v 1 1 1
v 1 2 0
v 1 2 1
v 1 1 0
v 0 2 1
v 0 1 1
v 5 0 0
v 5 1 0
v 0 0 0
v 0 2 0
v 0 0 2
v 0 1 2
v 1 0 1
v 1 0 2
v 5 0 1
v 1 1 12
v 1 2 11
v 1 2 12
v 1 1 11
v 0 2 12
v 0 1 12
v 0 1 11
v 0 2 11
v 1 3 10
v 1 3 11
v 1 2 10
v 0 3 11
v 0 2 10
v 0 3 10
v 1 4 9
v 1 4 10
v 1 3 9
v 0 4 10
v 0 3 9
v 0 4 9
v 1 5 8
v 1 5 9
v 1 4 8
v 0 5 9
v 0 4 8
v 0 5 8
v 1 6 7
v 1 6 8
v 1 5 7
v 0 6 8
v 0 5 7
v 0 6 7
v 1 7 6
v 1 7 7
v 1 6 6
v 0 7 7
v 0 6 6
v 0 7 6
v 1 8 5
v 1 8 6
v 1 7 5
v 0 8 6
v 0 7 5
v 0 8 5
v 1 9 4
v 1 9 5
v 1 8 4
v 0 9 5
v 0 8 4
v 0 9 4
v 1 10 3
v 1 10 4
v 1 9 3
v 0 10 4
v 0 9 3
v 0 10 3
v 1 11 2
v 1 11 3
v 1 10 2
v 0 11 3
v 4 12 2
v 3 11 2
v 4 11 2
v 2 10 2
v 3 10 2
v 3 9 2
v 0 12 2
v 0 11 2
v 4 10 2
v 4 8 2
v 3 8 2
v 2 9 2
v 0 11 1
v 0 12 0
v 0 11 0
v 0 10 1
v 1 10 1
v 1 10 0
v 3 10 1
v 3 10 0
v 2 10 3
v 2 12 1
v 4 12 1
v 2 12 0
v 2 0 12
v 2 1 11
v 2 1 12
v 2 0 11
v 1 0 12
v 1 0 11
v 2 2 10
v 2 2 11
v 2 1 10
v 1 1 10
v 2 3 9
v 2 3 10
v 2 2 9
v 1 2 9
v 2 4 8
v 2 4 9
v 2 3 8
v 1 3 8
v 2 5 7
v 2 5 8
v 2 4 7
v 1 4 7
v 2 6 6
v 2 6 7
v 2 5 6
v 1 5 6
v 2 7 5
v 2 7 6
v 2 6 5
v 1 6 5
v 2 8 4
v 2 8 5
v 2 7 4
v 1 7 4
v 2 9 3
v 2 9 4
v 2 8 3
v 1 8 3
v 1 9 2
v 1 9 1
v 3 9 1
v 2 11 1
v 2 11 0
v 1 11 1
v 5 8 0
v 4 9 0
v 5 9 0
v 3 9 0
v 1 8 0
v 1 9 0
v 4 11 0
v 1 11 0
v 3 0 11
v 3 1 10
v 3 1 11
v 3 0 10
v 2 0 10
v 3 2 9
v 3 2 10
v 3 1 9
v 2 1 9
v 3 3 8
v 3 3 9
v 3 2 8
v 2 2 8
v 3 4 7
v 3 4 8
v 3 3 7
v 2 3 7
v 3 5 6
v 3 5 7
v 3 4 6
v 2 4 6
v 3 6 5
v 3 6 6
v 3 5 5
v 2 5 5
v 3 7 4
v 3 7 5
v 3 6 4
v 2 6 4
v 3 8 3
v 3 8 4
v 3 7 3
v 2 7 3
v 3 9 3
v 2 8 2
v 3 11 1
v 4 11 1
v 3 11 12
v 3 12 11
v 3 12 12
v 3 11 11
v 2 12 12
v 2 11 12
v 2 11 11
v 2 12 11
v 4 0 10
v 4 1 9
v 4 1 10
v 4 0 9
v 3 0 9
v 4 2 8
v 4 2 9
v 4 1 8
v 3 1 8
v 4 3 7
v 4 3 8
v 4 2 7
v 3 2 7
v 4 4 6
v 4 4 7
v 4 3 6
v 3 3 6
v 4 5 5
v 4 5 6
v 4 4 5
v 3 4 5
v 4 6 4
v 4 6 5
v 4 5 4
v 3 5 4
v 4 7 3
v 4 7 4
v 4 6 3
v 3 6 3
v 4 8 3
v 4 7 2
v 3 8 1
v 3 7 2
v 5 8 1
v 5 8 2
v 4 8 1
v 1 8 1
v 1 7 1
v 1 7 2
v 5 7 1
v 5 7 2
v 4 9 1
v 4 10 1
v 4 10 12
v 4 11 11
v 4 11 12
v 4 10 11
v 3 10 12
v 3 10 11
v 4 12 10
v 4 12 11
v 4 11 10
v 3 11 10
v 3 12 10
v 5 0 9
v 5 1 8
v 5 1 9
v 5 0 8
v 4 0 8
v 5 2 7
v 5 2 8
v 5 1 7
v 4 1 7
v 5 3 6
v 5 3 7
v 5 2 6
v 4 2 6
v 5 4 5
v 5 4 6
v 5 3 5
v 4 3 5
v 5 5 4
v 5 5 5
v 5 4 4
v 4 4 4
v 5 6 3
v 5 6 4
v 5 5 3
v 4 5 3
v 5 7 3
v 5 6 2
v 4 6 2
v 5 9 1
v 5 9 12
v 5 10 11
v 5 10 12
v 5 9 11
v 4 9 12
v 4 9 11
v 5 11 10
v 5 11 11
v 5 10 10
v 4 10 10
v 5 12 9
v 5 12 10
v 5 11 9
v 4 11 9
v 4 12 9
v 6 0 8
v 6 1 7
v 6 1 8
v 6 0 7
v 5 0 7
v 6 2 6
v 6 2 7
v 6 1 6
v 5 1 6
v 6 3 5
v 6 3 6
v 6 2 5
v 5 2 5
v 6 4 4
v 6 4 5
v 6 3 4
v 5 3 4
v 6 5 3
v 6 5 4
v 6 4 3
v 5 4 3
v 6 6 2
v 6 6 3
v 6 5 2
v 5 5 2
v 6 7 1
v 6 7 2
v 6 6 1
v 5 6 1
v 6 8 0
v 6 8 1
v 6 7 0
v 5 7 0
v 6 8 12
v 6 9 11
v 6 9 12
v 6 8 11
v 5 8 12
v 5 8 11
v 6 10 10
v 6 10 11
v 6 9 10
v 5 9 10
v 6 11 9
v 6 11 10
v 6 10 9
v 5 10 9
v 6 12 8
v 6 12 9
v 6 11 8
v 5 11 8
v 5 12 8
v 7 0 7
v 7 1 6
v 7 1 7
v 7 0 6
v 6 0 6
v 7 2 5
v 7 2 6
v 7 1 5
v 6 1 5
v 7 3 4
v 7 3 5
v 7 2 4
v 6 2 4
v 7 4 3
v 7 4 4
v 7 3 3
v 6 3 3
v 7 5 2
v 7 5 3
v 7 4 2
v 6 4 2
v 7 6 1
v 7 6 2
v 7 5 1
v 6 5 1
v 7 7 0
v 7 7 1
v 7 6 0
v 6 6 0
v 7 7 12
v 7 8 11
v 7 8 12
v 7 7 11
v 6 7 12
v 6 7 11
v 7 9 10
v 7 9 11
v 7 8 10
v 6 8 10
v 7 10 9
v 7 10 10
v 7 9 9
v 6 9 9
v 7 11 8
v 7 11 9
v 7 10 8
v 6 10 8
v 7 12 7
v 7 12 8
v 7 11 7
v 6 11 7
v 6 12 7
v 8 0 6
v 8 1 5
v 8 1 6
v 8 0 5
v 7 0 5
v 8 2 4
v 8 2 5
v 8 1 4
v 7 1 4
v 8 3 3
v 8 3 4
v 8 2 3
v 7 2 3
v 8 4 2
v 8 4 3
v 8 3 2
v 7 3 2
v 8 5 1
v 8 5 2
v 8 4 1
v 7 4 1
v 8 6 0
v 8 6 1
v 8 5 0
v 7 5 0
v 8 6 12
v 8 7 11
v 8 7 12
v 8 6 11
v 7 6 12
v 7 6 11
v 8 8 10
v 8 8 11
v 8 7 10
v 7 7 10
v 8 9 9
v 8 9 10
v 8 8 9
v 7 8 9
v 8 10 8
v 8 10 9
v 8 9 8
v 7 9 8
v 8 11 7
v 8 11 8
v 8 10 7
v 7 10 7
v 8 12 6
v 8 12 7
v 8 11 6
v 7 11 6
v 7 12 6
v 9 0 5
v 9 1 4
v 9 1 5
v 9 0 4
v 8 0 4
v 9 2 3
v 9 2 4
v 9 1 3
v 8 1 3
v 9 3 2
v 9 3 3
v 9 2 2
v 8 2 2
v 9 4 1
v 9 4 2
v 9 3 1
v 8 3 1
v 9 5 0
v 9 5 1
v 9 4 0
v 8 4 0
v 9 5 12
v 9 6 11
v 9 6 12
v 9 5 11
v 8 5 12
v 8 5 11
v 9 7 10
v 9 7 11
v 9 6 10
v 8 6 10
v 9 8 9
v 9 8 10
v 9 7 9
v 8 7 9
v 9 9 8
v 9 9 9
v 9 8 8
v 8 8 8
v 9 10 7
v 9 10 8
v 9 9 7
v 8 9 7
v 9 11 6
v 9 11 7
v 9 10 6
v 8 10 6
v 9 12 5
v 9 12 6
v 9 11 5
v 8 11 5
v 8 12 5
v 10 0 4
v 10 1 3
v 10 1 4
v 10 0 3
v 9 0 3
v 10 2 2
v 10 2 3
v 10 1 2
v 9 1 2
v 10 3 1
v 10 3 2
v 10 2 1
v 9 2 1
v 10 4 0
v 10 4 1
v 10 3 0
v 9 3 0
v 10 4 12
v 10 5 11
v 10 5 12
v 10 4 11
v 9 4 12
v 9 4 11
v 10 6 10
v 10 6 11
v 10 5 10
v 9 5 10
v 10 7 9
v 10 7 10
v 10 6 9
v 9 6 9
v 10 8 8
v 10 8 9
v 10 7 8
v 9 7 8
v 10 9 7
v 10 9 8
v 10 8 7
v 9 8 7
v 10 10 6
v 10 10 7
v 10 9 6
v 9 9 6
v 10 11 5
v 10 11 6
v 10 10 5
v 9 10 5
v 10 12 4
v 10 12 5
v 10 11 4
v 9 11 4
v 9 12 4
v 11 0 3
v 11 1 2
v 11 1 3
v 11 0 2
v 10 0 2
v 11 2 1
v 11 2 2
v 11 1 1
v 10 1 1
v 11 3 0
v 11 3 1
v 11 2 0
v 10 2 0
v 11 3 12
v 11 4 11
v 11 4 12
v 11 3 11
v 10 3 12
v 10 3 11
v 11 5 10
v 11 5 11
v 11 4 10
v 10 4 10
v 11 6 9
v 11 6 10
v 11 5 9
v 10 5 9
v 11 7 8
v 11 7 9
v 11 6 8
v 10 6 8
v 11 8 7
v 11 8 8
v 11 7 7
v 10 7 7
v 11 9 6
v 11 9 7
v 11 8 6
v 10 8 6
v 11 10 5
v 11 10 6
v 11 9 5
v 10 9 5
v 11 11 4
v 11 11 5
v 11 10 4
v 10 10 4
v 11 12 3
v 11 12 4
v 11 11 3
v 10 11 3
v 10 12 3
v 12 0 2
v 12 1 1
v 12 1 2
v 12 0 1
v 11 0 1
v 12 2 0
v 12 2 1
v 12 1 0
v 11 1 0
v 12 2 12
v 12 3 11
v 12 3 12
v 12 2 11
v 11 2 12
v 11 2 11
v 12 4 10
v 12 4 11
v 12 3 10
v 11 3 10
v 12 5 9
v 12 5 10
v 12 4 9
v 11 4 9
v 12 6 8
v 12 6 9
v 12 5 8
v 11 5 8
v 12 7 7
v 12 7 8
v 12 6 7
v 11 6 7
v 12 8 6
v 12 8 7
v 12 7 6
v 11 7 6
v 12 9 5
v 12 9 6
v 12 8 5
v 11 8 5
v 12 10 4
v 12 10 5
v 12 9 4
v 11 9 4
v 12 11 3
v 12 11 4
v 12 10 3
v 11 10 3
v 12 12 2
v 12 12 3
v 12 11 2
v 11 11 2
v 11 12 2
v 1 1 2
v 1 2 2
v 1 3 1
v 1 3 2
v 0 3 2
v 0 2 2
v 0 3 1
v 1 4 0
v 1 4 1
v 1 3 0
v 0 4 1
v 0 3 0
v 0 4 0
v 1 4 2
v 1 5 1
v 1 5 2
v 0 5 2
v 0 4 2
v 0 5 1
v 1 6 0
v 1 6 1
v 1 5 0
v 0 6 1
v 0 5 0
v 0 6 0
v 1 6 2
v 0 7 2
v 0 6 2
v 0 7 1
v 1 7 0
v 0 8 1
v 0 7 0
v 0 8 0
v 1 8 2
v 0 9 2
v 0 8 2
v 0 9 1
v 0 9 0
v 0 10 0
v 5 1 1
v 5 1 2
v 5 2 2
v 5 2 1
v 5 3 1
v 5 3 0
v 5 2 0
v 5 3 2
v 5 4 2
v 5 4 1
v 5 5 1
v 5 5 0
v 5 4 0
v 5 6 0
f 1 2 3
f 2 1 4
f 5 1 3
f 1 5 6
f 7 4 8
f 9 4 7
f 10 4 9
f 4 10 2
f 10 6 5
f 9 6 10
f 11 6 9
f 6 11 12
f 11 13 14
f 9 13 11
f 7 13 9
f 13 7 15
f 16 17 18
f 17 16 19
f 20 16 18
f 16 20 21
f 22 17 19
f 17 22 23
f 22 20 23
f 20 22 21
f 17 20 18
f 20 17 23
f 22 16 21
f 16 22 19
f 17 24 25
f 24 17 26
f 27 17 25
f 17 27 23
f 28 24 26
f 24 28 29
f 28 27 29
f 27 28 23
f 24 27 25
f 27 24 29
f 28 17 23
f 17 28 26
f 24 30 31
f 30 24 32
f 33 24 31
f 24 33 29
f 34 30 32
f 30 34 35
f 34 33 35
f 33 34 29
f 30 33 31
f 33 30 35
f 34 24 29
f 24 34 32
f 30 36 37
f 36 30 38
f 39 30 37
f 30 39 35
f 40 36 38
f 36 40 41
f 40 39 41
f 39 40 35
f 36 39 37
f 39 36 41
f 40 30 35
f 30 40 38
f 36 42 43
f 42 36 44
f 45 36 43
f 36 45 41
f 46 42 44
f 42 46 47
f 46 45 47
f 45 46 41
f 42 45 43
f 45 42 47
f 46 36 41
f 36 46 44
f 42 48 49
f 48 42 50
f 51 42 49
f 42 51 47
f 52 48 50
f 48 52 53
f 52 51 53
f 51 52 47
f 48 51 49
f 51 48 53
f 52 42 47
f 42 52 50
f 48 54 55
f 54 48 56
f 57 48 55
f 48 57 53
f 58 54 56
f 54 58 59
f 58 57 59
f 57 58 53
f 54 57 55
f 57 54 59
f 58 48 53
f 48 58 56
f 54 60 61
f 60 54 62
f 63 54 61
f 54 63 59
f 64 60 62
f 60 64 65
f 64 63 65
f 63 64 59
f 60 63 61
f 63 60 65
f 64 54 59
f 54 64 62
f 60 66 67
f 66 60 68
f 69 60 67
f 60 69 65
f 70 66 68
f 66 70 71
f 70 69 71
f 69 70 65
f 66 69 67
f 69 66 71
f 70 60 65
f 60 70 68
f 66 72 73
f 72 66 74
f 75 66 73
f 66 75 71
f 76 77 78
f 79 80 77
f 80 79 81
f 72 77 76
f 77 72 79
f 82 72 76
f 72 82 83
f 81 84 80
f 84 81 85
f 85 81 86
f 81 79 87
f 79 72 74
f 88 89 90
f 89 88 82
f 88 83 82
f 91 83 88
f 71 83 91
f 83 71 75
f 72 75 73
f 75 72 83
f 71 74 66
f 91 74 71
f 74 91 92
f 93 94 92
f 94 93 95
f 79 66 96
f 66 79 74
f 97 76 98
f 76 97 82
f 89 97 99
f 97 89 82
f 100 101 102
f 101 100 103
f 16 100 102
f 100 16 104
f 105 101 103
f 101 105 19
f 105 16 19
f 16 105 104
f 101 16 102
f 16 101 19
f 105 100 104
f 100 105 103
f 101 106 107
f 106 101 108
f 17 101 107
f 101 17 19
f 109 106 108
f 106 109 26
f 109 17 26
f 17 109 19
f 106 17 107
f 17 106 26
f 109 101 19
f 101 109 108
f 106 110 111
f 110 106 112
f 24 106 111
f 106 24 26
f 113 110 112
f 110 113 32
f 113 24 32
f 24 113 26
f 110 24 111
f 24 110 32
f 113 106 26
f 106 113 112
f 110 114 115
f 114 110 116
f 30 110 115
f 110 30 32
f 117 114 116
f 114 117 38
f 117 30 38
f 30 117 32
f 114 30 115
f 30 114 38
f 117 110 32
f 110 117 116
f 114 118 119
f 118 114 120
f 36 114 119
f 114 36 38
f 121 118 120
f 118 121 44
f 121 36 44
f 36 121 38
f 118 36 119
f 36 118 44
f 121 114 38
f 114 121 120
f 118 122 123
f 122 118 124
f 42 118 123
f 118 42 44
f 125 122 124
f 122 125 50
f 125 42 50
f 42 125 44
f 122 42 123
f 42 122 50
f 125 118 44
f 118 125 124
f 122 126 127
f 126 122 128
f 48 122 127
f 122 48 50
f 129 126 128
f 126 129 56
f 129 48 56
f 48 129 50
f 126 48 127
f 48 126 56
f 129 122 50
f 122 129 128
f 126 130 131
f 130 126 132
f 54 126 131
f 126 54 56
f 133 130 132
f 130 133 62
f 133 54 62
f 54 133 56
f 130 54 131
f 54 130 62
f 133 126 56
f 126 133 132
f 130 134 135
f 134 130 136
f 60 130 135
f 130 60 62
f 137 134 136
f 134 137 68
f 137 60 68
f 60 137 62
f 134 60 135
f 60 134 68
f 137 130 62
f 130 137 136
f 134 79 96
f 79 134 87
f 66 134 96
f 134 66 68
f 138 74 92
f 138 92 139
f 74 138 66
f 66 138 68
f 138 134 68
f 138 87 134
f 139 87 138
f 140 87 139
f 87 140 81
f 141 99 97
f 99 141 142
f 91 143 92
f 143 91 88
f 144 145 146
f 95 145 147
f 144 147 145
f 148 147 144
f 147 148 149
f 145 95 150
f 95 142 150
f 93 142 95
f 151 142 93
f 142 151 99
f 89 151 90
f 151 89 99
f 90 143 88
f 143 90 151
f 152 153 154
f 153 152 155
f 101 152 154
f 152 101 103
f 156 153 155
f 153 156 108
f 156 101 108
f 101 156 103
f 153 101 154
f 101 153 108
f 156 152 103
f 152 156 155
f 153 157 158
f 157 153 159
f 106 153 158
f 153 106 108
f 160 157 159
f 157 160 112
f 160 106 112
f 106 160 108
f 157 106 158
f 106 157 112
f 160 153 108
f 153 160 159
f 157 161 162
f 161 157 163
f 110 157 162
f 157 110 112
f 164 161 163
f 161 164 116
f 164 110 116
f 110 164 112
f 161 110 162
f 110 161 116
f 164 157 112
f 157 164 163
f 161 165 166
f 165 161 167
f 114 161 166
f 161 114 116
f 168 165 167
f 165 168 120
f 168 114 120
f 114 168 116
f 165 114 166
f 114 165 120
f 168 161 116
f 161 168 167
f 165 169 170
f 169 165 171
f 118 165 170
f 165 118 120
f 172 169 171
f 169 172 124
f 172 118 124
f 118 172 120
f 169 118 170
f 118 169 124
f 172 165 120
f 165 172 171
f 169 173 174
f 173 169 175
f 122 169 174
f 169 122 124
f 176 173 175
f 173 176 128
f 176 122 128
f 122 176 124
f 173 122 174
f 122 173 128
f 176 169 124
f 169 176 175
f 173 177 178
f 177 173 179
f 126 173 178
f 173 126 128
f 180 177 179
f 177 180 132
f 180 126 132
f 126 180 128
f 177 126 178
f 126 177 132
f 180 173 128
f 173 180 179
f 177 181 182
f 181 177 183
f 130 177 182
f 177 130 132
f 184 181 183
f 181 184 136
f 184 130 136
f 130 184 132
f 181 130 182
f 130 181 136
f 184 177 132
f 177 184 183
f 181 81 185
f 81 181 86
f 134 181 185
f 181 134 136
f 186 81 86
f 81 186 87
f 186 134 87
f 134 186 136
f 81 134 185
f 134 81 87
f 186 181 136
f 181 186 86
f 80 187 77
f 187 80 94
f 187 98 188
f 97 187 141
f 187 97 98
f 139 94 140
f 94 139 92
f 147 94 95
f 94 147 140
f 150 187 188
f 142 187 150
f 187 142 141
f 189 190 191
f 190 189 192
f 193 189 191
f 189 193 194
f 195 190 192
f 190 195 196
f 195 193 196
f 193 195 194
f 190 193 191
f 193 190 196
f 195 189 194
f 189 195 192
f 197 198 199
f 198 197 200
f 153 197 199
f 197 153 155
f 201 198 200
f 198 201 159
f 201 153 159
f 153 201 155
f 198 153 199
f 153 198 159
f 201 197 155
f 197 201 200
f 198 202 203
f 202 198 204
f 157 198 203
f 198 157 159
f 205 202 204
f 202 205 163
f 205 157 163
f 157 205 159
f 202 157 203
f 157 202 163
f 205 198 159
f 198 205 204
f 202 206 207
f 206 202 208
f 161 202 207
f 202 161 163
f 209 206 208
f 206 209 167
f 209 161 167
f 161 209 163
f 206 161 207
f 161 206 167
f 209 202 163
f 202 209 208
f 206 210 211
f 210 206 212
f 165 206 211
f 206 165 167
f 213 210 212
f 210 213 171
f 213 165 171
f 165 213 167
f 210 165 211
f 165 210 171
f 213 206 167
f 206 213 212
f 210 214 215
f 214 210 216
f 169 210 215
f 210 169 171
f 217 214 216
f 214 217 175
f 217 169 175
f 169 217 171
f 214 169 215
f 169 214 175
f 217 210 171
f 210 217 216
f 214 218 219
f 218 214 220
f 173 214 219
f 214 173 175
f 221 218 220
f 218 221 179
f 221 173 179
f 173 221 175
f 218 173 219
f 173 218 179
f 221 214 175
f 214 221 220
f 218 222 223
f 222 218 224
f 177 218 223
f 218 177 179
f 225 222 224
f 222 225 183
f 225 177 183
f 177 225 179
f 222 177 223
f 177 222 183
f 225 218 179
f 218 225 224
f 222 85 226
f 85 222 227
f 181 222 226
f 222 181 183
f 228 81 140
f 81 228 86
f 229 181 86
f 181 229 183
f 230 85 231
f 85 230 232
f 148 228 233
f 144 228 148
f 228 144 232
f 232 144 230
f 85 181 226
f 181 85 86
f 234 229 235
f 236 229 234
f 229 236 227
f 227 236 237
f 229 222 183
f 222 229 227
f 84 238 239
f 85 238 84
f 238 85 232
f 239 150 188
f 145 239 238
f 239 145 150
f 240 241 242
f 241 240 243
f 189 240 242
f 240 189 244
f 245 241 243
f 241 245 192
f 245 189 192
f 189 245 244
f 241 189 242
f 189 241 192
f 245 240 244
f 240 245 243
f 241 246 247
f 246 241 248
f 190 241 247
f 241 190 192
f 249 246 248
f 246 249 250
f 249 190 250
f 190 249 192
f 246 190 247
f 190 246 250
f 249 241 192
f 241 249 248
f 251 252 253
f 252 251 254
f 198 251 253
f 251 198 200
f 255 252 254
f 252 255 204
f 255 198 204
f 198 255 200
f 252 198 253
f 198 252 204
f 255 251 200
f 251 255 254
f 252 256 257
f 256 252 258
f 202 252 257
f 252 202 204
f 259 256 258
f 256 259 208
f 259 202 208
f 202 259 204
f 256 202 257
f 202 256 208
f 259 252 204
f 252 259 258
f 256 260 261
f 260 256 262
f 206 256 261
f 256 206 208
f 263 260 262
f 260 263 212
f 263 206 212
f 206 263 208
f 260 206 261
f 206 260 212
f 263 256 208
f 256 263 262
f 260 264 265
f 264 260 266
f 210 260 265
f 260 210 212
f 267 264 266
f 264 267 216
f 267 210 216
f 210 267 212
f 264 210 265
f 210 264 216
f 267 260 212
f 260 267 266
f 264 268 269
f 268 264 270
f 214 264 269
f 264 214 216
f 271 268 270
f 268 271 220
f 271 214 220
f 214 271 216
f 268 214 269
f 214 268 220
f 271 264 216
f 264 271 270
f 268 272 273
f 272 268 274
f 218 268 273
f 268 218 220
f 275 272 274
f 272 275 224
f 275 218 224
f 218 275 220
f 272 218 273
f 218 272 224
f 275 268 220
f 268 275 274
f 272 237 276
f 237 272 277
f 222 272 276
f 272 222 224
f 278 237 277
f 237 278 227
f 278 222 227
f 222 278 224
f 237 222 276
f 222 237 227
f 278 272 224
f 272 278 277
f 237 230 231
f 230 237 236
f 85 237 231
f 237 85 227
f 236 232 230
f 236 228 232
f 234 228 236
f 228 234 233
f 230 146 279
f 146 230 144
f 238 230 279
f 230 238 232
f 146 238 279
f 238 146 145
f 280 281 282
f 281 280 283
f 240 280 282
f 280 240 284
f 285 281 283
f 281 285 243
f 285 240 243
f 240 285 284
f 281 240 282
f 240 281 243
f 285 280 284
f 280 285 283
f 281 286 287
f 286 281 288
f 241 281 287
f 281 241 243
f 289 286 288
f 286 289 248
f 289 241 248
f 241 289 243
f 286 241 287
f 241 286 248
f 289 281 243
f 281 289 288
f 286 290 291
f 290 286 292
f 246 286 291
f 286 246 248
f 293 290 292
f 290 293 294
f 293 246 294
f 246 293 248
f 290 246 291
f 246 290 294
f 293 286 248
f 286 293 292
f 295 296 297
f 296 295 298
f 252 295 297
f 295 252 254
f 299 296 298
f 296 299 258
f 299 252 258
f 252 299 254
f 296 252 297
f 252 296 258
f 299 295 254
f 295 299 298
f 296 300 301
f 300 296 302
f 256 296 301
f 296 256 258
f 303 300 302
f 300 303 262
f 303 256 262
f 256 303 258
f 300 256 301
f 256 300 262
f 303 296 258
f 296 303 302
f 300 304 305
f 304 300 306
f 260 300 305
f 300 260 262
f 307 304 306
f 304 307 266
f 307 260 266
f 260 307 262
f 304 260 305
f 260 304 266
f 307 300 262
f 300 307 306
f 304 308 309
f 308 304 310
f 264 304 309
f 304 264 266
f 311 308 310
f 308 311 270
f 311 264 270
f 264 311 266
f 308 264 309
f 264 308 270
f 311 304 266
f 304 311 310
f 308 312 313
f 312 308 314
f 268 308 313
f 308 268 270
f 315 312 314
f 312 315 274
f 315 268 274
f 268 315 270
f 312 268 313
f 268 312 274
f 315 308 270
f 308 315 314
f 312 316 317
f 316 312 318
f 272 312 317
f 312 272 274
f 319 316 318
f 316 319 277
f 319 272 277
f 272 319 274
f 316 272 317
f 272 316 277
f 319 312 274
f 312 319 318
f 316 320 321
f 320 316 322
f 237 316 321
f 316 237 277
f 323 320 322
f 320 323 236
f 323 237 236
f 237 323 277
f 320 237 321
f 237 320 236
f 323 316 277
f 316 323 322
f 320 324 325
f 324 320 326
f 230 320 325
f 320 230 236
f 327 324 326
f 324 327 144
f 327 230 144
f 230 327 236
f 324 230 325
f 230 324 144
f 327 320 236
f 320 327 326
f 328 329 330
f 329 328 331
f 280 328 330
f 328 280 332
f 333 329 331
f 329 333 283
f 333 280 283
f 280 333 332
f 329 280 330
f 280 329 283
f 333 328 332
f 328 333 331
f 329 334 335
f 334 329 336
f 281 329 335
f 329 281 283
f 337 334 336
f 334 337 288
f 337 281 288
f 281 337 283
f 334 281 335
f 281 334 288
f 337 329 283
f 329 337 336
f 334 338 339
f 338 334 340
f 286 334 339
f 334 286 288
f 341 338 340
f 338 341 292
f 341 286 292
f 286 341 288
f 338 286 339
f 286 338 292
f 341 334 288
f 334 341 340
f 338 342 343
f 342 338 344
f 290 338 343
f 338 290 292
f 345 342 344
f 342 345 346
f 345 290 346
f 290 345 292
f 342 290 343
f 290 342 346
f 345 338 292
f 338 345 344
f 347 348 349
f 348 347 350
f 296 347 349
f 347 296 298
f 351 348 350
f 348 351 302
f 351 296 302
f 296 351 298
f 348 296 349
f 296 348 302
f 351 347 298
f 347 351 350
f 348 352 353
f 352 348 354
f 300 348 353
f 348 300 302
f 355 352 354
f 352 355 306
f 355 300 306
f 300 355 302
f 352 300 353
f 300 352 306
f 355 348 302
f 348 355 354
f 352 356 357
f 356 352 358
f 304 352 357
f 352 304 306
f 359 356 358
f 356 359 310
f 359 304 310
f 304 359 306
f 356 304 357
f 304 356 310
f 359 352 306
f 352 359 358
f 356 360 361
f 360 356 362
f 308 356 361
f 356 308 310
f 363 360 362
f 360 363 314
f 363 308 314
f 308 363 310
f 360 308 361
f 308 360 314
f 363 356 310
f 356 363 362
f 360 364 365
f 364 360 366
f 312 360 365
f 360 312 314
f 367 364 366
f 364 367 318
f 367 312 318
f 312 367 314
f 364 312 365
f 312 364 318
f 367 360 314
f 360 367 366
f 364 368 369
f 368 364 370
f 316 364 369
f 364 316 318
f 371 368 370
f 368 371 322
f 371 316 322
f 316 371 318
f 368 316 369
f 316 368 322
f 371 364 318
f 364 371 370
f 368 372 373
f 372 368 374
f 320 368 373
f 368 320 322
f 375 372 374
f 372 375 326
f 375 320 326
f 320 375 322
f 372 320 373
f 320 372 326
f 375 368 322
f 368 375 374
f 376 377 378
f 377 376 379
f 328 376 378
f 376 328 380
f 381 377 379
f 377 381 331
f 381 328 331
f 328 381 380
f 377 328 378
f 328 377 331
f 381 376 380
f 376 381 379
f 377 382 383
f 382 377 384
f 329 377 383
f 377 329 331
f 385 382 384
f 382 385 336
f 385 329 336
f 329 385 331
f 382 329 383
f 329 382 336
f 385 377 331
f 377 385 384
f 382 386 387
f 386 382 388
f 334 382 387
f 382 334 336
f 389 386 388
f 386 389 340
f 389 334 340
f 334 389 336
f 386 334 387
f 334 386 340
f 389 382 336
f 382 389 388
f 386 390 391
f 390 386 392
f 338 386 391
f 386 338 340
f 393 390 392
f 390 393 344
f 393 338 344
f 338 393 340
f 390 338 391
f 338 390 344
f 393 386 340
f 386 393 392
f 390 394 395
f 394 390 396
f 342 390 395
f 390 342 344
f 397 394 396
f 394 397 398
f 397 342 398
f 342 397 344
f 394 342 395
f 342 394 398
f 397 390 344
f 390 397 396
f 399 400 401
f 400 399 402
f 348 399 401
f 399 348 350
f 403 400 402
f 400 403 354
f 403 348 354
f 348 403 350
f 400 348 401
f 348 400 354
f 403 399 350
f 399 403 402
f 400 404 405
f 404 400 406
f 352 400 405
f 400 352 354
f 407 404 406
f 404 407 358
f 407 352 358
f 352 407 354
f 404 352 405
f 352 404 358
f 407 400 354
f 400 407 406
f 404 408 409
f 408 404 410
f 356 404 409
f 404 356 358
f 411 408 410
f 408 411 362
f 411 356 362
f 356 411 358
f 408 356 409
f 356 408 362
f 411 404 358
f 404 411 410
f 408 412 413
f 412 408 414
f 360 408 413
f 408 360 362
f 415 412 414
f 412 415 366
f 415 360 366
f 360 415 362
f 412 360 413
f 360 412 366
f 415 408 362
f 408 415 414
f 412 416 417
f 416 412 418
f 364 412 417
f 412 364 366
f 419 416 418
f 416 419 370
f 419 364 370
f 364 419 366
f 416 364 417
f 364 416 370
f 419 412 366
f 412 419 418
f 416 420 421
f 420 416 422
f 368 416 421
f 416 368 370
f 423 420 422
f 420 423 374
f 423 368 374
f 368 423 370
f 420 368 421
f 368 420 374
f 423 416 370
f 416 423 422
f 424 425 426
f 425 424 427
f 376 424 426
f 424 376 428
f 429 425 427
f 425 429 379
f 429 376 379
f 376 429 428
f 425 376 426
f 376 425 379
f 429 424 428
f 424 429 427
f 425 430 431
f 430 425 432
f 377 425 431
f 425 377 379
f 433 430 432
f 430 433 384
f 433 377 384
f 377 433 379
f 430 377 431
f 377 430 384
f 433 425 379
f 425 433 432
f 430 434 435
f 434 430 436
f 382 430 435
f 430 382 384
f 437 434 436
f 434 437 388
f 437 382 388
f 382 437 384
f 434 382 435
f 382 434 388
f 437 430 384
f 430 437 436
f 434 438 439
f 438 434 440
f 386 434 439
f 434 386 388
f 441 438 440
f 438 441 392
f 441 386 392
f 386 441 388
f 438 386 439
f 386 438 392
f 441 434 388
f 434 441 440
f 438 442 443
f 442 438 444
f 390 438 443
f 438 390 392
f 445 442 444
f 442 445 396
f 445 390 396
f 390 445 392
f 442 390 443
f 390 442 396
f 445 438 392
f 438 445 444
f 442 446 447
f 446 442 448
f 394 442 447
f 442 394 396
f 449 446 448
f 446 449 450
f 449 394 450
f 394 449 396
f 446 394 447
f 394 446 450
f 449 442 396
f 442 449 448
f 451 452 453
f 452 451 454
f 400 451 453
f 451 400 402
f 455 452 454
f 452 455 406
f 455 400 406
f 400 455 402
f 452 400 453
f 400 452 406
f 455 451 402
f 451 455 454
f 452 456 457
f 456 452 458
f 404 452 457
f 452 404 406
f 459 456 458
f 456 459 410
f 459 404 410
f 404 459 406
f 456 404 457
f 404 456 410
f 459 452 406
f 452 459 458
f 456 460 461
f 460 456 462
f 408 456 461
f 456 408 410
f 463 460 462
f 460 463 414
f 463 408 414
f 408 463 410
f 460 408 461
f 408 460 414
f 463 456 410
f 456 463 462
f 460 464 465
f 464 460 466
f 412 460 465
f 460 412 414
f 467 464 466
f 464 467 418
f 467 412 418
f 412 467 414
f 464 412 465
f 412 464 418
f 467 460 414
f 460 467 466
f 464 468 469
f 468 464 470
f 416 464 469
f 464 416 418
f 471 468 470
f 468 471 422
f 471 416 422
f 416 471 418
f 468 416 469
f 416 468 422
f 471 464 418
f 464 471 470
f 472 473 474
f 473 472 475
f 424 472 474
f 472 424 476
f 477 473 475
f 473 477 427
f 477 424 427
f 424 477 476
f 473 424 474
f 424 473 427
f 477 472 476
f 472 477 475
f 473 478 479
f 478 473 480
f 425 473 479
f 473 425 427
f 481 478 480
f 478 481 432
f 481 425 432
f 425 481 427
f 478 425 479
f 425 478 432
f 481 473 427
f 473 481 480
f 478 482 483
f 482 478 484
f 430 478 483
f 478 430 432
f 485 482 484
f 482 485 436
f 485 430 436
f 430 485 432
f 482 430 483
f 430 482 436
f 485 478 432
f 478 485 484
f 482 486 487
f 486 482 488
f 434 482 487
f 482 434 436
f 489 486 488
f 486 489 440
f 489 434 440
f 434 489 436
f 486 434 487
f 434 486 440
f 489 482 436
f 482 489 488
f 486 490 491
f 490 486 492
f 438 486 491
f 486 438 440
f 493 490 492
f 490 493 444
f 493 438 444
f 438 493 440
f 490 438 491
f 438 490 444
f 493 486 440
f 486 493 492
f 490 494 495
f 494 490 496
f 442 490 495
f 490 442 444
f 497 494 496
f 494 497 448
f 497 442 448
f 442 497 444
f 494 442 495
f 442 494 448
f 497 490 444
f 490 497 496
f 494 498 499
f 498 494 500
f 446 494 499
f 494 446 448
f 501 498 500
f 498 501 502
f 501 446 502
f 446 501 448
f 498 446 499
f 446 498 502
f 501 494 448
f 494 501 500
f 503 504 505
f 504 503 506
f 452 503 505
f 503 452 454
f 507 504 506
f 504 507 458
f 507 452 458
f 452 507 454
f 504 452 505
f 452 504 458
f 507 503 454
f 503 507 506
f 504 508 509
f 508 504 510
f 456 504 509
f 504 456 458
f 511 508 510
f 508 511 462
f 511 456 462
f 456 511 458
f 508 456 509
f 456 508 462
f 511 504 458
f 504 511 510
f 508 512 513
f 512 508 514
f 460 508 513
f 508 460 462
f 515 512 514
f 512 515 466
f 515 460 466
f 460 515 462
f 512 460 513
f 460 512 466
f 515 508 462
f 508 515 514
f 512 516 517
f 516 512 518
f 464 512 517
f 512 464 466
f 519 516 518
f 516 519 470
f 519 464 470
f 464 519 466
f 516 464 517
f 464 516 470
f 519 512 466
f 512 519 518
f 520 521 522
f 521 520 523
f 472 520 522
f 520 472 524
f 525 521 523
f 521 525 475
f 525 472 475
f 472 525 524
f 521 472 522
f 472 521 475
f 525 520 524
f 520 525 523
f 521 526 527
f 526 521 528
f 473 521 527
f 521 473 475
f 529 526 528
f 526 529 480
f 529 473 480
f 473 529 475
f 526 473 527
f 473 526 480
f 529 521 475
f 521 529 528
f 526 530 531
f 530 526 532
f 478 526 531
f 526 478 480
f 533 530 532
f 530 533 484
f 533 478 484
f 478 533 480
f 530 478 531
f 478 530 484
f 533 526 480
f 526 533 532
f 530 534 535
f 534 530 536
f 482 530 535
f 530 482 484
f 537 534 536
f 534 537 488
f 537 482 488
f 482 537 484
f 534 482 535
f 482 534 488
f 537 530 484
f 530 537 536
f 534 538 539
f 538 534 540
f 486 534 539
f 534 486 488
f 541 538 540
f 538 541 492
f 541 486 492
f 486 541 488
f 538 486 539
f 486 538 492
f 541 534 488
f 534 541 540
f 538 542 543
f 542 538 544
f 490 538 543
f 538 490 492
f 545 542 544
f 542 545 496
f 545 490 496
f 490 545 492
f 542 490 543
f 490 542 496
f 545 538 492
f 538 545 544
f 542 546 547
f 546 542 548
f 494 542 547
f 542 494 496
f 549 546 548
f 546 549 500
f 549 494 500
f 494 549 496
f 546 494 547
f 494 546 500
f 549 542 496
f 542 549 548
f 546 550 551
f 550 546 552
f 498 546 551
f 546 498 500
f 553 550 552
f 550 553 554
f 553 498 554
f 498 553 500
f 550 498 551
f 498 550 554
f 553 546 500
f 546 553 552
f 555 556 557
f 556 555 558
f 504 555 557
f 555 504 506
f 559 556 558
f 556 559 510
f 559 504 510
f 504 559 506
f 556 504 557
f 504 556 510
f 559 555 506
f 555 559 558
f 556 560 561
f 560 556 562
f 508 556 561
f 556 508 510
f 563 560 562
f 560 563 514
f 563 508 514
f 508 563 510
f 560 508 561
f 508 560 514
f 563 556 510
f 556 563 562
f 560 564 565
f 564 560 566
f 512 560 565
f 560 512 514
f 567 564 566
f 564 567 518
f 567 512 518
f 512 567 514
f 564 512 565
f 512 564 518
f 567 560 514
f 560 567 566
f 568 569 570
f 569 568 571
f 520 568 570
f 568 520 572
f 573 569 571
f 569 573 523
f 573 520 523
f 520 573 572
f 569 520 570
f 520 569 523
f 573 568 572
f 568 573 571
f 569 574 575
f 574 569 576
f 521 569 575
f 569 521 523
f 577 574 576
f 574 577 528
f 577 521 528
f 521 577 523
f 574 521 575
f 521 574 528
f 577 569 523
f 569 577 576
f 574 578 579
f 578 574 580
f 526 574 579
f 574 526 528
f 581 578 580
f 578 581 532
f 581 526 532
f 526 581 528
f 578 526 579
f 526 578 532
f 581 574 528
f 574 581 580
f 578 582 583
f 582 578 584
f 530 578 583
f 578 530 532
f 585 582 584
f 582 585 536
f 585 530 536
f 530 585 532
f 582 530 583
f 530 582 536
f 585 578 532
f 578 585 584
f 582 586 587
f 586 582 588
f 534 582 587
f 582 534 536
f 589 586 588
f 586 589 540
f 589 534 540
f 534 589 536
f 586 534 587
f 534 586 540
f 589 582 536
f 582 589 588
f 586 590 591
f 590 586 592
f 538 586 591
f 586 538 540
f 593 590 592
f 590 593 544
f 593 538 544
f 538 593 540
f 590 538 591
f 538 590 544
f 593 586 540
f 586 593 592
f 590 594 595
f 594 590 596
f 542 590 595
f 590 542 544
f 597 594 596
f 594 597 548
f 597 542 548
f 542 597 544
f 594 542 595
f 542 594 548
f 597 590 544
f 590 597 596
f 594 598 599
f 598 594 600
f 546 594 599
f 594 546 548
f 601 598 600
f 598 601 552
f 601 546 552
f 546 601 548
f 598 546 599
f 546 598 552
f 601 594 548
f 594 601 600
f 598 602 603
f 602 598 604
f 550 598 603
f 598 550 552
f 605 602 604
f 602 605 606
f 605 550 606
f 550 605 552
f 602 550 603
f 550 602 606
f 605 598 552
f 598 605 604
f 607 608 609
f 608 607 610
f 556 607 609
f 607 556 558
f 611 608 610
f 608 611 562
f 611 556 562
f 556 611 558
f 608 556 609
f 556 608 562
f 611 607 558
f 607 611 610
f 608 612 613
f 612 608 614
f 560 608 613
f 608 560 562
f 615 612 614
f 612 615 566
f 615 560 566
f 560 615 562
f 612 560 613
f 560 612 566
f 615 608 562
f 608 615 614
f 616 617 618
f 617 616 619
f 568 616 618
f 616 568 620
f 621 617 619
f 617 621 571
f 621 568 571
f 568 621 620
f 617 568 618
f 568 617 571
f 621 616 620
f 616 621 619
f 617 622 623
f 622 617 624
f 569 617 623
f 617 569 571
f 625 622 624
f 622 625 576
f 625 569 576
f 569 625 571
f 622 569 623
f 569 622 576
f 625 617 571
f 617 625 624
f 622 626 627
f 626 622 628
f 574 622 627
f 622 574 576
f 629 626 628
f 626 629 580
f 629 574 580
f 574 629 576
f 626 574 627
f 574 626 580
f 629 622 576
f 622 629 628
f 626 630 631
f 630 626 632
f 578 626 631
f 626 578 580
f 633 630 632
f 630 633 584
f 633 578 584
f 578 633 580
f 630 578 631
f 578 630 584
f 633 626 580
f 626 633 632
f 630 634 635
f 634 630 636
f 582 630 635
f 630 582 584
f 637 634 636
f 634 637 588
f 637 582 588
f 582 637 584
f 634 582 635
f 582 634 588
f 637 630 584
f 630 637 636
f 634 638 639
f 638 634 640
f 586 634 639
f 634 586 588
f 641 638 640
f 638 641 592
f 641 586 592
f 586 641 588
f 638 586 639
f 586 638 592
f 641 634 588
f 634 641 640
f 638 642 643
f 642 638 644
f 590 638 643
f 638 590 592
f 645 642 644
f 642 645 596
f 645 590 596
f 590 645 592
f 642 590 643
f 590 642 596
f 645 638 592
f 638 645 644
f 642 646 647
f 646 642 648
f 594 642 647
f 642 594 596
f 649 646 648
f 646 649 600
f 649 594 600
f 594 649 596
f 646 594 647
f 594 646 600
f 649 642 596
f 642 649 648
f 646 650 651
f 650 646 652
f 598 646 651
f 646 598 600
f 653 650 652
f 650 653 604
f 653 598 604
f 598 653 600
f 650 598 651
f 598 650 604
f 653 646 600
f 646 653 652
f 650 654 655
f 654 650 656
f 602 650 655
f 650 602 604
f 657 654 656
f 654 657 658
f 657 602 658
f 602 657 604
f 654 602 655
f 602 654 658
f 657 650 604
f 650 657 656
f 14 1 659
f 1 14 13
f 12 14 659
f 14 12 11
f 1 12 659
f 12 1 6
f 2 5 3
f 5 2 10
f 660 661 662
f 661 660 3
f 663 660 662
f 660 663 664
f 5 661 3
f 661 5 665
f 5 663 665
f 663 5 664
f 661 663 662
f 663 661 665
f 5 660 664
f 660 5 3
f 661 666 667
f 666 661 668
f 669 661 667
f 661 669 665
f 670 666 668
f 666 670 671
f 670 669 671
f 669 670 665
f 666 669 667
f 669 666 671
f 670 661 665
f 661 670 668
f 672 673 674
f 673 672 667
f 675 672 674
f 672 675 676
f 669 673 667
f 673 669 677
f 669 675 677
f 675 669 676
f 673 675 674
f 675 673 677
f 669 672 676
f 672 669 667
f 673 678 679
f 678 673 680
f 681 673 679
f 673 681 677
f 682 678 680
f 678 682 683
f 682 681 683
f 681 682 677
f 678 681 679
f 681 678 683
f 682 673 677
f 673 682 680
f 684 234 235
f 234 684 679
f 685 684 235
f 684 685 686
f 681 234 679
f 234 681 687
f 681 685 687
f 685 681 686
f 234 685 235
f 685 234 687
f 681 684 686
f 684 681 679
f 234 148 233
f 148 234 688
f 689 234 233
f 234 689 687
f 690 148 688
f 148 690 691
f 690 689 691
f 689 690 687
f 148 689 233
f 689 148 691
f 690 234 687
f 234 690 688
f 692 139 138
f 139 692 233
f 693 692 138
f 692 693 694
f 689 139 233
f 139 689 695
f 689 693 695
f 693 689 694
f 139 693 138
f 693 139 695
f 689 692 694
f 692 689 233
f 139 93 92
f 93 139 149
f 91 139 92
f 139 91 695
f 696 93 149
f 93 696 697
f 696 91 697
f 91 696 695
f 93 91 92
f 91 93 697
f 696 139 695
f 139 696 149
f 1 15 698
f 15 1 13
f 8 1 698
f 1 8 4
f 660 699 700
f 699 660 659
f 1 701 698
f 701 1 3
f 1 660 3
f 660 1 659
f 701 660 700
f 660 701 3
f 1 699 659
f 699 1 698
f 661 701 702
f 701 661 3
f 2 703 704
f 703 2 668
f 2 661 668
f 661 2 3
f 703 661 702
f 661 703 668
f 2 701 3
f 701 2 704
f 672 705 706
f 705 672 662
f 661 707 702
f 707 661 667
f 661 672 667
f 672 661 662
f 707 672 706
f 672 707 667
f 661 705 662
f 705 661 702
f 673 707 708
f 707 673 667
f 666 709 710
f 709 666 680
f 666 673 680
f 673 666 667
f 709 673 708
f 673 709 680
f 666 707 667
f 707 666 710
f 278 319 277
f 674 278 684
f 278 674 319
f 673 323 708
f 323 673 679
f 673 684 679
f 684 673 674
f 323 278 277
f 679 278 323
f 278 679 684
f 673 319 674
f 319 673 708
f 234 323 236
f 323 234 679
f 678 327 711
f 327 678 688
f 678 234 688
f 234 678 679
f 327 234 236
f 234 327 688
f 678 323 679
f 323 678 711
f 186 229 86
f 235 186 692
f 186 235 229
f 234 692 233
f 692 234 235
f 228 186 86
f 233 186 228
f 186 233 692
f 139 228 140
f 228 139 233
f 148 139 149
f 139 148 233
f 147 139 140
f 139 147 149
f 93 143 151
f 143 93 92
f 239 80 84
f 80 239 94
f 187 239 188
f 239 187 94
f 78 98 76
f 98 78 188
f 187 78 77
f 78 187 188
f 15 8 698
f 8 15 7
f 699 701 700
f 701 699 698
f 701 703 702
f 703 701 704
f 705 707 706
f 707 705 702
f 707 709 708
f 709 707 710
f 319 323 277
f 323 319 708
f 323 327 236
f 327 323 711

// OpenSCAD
union() {
    translate([0, 0, 0]) cube([1, 1, 1]);
    translate([0, 1, 11]) cube([1, 1, 1]);
    translate([0, 2, 10]) cube([1, 1, 1]);
    translate([0, 3, 9]) cube([1, 1, 1]);
    translate([0, 4, 8]) cube([1, 1, 1]);
    translate([0, 5, 7]) cube([1, 1, 1]);
    translate([0, 6, 6]) cube([1, 1, 1]);
    translate([0, 7, 5]) cube([1, 1, 1]);
    translate([0, 8, 4]) cube([1, 1, 1]);
    translate([0, 9, 3]) cube([1, 1, 1]);
    translate([0, 10, 2]) cube([1, 1, 1]);
    translate([0, 11, 1]) cube([1, 1, 1]);
    translate([1, 0, 11]) cube([1, 1, 1]);
    translate([1, 1, 10]) cube([1, 1, 1]);
    translate([1, 2, 9]) cube([1, 1, 1]);
    translate([1, 3, 8]) cube([1, 1, 1]);
    translate([1, 4, 7]) cube([1, 1, 1]);
    translate([1, 5, 6]) cube([1, 1, 1]);
    translate([1, 6, 5]) cube([1, 1, 1]);
    translate([1, 7, 4]) cube([1, 1, 1]);
    translate([1, 8, 3]) cube([1, 1, 1]);
    translate([1, 9, 2]) cube([1, 1, 1]);
    translate([1, 10, 1]) cube([1, 1, 1]);
    translate([1, 11, 0]) cube([1, 1, 1]);
    translate([2, 0, 10]) cube([1, 1, 1]);
    translate([2, 1, 9]) cube([1, 1, 1]);
    translate([2, 2, 8]) cube([1, 1, 1]);
    translate([2, 3, 7]) cube([1, 1, 1]);
    translate([2, 4, 6]) cube([1, 1, 1]);
    translate([2, 5, 5]) cube([1, 1, 1]);
    translate([2, 6, 4]) cube([1, 1, 1]);
    translate([2, 7, 3]) cube([1, 1, 1]);
    translate([2, 8, 2]) cube([1, 1, 1]);
    translate([2, 9, 1]) cube([1, 1, 1]);
    translate([2, 10, 0]) cube([1, 1, 1]);
    translate([2, 11, 11]) cube([1, 1, 1]);
    translate([3, 0, 9]) cube([1, 1, 1]);
    translate([3, 1, 8]) cube([1, 1, 1]);
    translate([3, 2, 7]) cube([1, 1, 1]);
    translate([3, 3, 6]) cube([1, 1, 1]);
    translate([3, 4, 5]) cube([1, 1, 1]);
    translate([3, 5, 4]) cube([1, 1, 1]);
    translate([3, 6, 3]) cube([1, 1, 1]);
    translate([3, 7, 2]) cube([1, 1, 1]);
    translate([3, 8, 1]) cube([1, 1, 1]);
    translate([3, 9, 0]) cube([1, 1, 1]);
    translate([3, 10, 11]) cube([1, 1, 1]);
    translate([3, 11, 10]) cube([1, 1, 1]);
    translate([4, 0, 8]) cube([1, 1, 1]);
    translate([4, 1, 7]) cube([1, 1, 1]);
    translate([4, 2, 6]) cube([1, 1, 1]);
    translate([4, 3, 5]) cube([1, 1, 1]);
    translate([4, 4, 4]) cube([1, 1, 1]);
    translate([4, 5, 3]) cube([1, 1, 1]);
    translate([4, 6, 2]) cube([1, 1, 1]);
    translate([4, 7, 1]) cube([1, 1, 1]);
    translate([4, 8, 0]) cube([1, 1, 1]);
    translate([4, 9, 11]) cube([1, 1, 1]);
    translate([4, 10, 10]) cube([1, 1, 1]);
    translate([4, 11, 9]) cube([1, 1, 1]);
    translate([5, 0, 7]) cube([1, 1, 1]);
    translate([5, 1, 6]) cube([1, 1, 1]);
    translate([5, 2, 5]) cube([1, 1, 1]);
    translate([5, 3, 4]) cube([1, 1, 1]);
    translate([5, 4, 3]) cube([1, 1, 1]);
    translate([5, 5, 2]) cube([1, 1, 1]);
    translate([5, 6, 1]) cube([1, 1, 1]);
    translate([5, 7, 0]) cube([1, 1, 1]);
    translate([5, 8, 11]) cube([1, 1, 1]);
    translate([5, 9, 10]) cube([1, 1, 1]);
    translate([5, 10, 9]) cube([1, 1, 1]);
    translate([5, 11, 8]) cube([1, 1, 1]);
    translate([6, 0, 6]) cube([1, 1, 1]);
    translate([6, 1, 5]) cube([1, 1, 1]);
    translate([6, 2, 4]) cube([1, 1, 1]);
    translate([6, 3, 3]) cube([1, 1, 1]);
    translate([6, 4, 2]) cube([1, 1, 1]);
    translate([6, 5, 1]) cube([1, 1, 1]);
    translate([6, 6, 0]) cube([1, 1, 1]);
    translate([6, 7, 11]) cube([1, 1, 1]);
    translate([6, 8, 10]) cube([1, 1, 1]);
    translate([6, 9, 9]) cube([1, 1, 1]);
    translate([6, 10, 8]) cube([1, 1, 1]);
    translate([6, 11, 7]) cube([1, 1, 1]);
    translate([7, 0, 5]) cube([1, 1, 1]);
    translate([7, 1, 4]) cube([1, 1, 1]);
    translate([7, 2, 3]) cube([1, 1, 1]);
    translate([7, 3, 2]) cube([1, 1, 1]);
    translate([7, 4, 1]) cube([1, 1, 1]);
    translate([7, 5, 0]) cube([1, 1, 1]);
    translate([7, 6, 11]) cube([1, 1, 1]);
    translate([7, 7, 10]) cube([1, 1, 1]);
    translate([7, 8, 9]) cube([1, 1, 1]);
    translate([7, 9, 8]) cube([1, 1, 1]);
    translate([7, 10, 7]) cube([1, 1, 1]);
    translate([7, 11, 6]) cube([1, 1, 1]);
    translate([8, 0, 4]) cube([1, 1, 1]);
    translate([8, 1, 3]) cube([1, 1, 1]);
    translate([8, 2, 2]) cube([1, 1, 1]);
    translate([8, 3, 1]) cube([1, 1, 1]);
    translate([8, 4, 0]) cube([1, 1, 1]);
    translate([8, 5, 11]) cube([1, 1, 1]);
    translate([8, 6, 10]) cube([1, 1, 1]);
    translate([8, 7, 9]) cube([1, 1, 1]);
    translate([8, 8, 8]) cube([1, 1, 1]);
    translate([8, 9, 7]) cube([1, 1, 1]);
    translate([8, 10, 6]) cube([1, 1, 1]);
    translate([8, 11, 5]) cube([1, 1, 1]);
    translate([9, 0, 3]) cube([1, 1, 1]);
    translate([9, 1, 2]) cube([1, 1, 1]);
    translate([9, 2, 1]) cube([1, 1, 1]);
    translate([9, 3, 0]) cube([1, 1, 1]);
    translate([9, 4, 11]) cube([1, 1, 1]);
    translate([9, 5, 10]) cube([1, 1, 1]);
    translate([9, 6, 9]) cube([1, 1, 1]);
    translate([9, 7, 8]) cube([1, 1, 1]);
    translate([9, 8, 7]) cube([1, 1, 1]);
    translate([9, 9, 6]) cube([1, 1, 1]);
    translate([9, 10, 5]) cube([1, 1, 1]);
    translate([9, 11, 4]) cube([1, 1, 1]);
    translate([10, 0, 2]) cube([1, 1, 1]);
    translate([10, 1, 1]) cube([1, 1, 1]);
    translate([10, 2, 0]) cube([1, 1, 1]);
    translate([10, 3, 11]) cube([1, 1, 1]);
    translate([10, 4, 10]) cube([1, 1, 1]);
    translate([10, 5, 9]) cube([1, 1, 1]);
    translate([10, 6, 8]) cube([1, 1, 1]);
    translate([10, 7, 7]) cube([1, 1, 1]);
    translate([10, 8, 6]) cube([1, 1, 1]);
    translate([10, 9, 5]) cube([1, 1, 1]);
    translate([10, 10, 4]) cube([1, 1, 1]);
    translate([10, 11, 3]) cube([1, 1, 1]);
    translate([11, 0, 1]) cube([1, 1, 1]);
    translate([11, 1, 0]) cube([1, 1, 1]);
    translate([11, 2, 11]) cube([1, 1, 1]);
    translate([11, 3, 10]) cube([1, 1, 1]);
    translate([11, 4, 9]) cube([1, 1, 1]);
    translate([11, 5, 8]) cube([1, 1, 1]);
    translate([11, 6, 7]) cube([1, 1, 1]);
    translate([11, 7, 6]) cube([1, 1, 1]);
    translate([11, 8, 5]) cube([1, 1, 1]);
    translate([11, 9, 4]) cube([1, 1, 1]);
    translate([11, 10, 3]) cube([1, 1, 1]);
    translate([11, 11, 2]) cube([1, 1, 1]);
    translate([0, 0, 1]) cube([1, 1, 1]);
    translate([0, 1, 0]) cube([1, 1, 1]);
    translate([0, 2, 1]) cube([1, 1, 1]);
    translate([0, 3, 0]) cube([1, 1, 1]);
    translate([0, 4, 1]) cube([1, 1, 1]);
    translate([0, 5, 0]) cube([1, 1, 1]);
    translate([0, 6, 1]) cube([1, 1, 1]);
    translate([0, 7, 0]) cube([1, 1, 1]);
    translate([0, 8, 1]) cube([1, 1, 1]);
    translate([0, 9, 0]) cube([1, 1, 1]);
    translate([0, 10, 1]) cube([1, 1, 1]);
    translate([0, 11, 0]) cube([1, 1, 1]);
    translate([1, 0, 0]) cube([1, 1, 1]);
    translate([1, 1, 1]) cube([1, 1, 1]);
    translate([1, 2, 0]) cube([1, 1, 1]);
    translate([1, 3, 1]) cube([1, 1, 1]);
    translate([1, 4, 0]) cube([1, 1, 1]);
    translate([1, 5, 1]) cube([1, 1, 1]);
    translate([1, 6, 0]) cube([1, 1, 1]);
    translate([1, 7, 1]) cube([1, 1, 1]);
    translate([1, 8, 0]) cube([1, 1, 1]);
    translate([1, 9, 1]) cube([1, 1, 1]);
    translate([1, 10, 0]) cube([1, 1, 1]);
    translate([1, 11, 1]) cube([1, 1, 1]);
    translate([2, 0, 0]) cube([1, 1, 1]);
    translate([2, 1, 1]) cube([1, 1, 1]);
    translate([2, 2, 0]) cube([1, 1, 1]);
    translate([2, 3, 1]) cube([1, 1, 1]);
    translate([2, 4, 0]) cube([1, 1, 1]);
    translate([2, 5, 1]) cube([1, 1, 1]);
    translate([2, 6, 0]) cube([1, 1, 1]);
    translate([2, 7, 1]) cube([1, 1, 1]);
    translate([2, 8, 0]) cube([1, 1, 1]);
    translate([2, 9, 1]) cube([1, 1, 1]);
    translate([2, 10, 1]) cube([1, 1, 1]);
    translate([2, 11, 1]) cube([1, 1, 1]);
    translate([3, 0, 0]) cube([1, 1, 1]);
    translate([3, 1, 1]) cube([1, 1, 1]);
    translate([3, 2, 0]) cube([1, 1, 1]);
    translate([3, 3, 1]) cube([1, 1, 1]);
    translate([3, 4, 0]) cube([1, 1, 1]);
    translate([3, 5, 1]) cube([1, 1, 1]);
    translate([3, 6, 0]) cube([1, 1, 1]);
    translate([3, 7, 1]) cube([1, 1, 1]);
    translate([3, 8, 0]) cube([1, 1, 1]);
    translate([3, 9, 1]) cube([1, 1, 1]);
    translate([3, 10, 0]) cube([1, 1, 1]);
    translate([3, 11, 1]) cube([1, 1, 1]);
    translate([4, 0, 0]) cube([1, 1, 1]);
    translate([4, 1, 1]) cube([1, 1, 1]);
    translate([4, 2, 0]) cube([1, 1, 1]);
    translate([4, 3, 1]) cube([1, 1, 1]);
    translate([4, 4, 0]) cube([1, 1, 1]);
    translate([4, 5, 1]) cube([1, 1, 1]);
    translate([4, 6, 0]) cube([1, 1, 1]);
    translate([4, 7, 1]) cube([1, 1, 1]);
}
